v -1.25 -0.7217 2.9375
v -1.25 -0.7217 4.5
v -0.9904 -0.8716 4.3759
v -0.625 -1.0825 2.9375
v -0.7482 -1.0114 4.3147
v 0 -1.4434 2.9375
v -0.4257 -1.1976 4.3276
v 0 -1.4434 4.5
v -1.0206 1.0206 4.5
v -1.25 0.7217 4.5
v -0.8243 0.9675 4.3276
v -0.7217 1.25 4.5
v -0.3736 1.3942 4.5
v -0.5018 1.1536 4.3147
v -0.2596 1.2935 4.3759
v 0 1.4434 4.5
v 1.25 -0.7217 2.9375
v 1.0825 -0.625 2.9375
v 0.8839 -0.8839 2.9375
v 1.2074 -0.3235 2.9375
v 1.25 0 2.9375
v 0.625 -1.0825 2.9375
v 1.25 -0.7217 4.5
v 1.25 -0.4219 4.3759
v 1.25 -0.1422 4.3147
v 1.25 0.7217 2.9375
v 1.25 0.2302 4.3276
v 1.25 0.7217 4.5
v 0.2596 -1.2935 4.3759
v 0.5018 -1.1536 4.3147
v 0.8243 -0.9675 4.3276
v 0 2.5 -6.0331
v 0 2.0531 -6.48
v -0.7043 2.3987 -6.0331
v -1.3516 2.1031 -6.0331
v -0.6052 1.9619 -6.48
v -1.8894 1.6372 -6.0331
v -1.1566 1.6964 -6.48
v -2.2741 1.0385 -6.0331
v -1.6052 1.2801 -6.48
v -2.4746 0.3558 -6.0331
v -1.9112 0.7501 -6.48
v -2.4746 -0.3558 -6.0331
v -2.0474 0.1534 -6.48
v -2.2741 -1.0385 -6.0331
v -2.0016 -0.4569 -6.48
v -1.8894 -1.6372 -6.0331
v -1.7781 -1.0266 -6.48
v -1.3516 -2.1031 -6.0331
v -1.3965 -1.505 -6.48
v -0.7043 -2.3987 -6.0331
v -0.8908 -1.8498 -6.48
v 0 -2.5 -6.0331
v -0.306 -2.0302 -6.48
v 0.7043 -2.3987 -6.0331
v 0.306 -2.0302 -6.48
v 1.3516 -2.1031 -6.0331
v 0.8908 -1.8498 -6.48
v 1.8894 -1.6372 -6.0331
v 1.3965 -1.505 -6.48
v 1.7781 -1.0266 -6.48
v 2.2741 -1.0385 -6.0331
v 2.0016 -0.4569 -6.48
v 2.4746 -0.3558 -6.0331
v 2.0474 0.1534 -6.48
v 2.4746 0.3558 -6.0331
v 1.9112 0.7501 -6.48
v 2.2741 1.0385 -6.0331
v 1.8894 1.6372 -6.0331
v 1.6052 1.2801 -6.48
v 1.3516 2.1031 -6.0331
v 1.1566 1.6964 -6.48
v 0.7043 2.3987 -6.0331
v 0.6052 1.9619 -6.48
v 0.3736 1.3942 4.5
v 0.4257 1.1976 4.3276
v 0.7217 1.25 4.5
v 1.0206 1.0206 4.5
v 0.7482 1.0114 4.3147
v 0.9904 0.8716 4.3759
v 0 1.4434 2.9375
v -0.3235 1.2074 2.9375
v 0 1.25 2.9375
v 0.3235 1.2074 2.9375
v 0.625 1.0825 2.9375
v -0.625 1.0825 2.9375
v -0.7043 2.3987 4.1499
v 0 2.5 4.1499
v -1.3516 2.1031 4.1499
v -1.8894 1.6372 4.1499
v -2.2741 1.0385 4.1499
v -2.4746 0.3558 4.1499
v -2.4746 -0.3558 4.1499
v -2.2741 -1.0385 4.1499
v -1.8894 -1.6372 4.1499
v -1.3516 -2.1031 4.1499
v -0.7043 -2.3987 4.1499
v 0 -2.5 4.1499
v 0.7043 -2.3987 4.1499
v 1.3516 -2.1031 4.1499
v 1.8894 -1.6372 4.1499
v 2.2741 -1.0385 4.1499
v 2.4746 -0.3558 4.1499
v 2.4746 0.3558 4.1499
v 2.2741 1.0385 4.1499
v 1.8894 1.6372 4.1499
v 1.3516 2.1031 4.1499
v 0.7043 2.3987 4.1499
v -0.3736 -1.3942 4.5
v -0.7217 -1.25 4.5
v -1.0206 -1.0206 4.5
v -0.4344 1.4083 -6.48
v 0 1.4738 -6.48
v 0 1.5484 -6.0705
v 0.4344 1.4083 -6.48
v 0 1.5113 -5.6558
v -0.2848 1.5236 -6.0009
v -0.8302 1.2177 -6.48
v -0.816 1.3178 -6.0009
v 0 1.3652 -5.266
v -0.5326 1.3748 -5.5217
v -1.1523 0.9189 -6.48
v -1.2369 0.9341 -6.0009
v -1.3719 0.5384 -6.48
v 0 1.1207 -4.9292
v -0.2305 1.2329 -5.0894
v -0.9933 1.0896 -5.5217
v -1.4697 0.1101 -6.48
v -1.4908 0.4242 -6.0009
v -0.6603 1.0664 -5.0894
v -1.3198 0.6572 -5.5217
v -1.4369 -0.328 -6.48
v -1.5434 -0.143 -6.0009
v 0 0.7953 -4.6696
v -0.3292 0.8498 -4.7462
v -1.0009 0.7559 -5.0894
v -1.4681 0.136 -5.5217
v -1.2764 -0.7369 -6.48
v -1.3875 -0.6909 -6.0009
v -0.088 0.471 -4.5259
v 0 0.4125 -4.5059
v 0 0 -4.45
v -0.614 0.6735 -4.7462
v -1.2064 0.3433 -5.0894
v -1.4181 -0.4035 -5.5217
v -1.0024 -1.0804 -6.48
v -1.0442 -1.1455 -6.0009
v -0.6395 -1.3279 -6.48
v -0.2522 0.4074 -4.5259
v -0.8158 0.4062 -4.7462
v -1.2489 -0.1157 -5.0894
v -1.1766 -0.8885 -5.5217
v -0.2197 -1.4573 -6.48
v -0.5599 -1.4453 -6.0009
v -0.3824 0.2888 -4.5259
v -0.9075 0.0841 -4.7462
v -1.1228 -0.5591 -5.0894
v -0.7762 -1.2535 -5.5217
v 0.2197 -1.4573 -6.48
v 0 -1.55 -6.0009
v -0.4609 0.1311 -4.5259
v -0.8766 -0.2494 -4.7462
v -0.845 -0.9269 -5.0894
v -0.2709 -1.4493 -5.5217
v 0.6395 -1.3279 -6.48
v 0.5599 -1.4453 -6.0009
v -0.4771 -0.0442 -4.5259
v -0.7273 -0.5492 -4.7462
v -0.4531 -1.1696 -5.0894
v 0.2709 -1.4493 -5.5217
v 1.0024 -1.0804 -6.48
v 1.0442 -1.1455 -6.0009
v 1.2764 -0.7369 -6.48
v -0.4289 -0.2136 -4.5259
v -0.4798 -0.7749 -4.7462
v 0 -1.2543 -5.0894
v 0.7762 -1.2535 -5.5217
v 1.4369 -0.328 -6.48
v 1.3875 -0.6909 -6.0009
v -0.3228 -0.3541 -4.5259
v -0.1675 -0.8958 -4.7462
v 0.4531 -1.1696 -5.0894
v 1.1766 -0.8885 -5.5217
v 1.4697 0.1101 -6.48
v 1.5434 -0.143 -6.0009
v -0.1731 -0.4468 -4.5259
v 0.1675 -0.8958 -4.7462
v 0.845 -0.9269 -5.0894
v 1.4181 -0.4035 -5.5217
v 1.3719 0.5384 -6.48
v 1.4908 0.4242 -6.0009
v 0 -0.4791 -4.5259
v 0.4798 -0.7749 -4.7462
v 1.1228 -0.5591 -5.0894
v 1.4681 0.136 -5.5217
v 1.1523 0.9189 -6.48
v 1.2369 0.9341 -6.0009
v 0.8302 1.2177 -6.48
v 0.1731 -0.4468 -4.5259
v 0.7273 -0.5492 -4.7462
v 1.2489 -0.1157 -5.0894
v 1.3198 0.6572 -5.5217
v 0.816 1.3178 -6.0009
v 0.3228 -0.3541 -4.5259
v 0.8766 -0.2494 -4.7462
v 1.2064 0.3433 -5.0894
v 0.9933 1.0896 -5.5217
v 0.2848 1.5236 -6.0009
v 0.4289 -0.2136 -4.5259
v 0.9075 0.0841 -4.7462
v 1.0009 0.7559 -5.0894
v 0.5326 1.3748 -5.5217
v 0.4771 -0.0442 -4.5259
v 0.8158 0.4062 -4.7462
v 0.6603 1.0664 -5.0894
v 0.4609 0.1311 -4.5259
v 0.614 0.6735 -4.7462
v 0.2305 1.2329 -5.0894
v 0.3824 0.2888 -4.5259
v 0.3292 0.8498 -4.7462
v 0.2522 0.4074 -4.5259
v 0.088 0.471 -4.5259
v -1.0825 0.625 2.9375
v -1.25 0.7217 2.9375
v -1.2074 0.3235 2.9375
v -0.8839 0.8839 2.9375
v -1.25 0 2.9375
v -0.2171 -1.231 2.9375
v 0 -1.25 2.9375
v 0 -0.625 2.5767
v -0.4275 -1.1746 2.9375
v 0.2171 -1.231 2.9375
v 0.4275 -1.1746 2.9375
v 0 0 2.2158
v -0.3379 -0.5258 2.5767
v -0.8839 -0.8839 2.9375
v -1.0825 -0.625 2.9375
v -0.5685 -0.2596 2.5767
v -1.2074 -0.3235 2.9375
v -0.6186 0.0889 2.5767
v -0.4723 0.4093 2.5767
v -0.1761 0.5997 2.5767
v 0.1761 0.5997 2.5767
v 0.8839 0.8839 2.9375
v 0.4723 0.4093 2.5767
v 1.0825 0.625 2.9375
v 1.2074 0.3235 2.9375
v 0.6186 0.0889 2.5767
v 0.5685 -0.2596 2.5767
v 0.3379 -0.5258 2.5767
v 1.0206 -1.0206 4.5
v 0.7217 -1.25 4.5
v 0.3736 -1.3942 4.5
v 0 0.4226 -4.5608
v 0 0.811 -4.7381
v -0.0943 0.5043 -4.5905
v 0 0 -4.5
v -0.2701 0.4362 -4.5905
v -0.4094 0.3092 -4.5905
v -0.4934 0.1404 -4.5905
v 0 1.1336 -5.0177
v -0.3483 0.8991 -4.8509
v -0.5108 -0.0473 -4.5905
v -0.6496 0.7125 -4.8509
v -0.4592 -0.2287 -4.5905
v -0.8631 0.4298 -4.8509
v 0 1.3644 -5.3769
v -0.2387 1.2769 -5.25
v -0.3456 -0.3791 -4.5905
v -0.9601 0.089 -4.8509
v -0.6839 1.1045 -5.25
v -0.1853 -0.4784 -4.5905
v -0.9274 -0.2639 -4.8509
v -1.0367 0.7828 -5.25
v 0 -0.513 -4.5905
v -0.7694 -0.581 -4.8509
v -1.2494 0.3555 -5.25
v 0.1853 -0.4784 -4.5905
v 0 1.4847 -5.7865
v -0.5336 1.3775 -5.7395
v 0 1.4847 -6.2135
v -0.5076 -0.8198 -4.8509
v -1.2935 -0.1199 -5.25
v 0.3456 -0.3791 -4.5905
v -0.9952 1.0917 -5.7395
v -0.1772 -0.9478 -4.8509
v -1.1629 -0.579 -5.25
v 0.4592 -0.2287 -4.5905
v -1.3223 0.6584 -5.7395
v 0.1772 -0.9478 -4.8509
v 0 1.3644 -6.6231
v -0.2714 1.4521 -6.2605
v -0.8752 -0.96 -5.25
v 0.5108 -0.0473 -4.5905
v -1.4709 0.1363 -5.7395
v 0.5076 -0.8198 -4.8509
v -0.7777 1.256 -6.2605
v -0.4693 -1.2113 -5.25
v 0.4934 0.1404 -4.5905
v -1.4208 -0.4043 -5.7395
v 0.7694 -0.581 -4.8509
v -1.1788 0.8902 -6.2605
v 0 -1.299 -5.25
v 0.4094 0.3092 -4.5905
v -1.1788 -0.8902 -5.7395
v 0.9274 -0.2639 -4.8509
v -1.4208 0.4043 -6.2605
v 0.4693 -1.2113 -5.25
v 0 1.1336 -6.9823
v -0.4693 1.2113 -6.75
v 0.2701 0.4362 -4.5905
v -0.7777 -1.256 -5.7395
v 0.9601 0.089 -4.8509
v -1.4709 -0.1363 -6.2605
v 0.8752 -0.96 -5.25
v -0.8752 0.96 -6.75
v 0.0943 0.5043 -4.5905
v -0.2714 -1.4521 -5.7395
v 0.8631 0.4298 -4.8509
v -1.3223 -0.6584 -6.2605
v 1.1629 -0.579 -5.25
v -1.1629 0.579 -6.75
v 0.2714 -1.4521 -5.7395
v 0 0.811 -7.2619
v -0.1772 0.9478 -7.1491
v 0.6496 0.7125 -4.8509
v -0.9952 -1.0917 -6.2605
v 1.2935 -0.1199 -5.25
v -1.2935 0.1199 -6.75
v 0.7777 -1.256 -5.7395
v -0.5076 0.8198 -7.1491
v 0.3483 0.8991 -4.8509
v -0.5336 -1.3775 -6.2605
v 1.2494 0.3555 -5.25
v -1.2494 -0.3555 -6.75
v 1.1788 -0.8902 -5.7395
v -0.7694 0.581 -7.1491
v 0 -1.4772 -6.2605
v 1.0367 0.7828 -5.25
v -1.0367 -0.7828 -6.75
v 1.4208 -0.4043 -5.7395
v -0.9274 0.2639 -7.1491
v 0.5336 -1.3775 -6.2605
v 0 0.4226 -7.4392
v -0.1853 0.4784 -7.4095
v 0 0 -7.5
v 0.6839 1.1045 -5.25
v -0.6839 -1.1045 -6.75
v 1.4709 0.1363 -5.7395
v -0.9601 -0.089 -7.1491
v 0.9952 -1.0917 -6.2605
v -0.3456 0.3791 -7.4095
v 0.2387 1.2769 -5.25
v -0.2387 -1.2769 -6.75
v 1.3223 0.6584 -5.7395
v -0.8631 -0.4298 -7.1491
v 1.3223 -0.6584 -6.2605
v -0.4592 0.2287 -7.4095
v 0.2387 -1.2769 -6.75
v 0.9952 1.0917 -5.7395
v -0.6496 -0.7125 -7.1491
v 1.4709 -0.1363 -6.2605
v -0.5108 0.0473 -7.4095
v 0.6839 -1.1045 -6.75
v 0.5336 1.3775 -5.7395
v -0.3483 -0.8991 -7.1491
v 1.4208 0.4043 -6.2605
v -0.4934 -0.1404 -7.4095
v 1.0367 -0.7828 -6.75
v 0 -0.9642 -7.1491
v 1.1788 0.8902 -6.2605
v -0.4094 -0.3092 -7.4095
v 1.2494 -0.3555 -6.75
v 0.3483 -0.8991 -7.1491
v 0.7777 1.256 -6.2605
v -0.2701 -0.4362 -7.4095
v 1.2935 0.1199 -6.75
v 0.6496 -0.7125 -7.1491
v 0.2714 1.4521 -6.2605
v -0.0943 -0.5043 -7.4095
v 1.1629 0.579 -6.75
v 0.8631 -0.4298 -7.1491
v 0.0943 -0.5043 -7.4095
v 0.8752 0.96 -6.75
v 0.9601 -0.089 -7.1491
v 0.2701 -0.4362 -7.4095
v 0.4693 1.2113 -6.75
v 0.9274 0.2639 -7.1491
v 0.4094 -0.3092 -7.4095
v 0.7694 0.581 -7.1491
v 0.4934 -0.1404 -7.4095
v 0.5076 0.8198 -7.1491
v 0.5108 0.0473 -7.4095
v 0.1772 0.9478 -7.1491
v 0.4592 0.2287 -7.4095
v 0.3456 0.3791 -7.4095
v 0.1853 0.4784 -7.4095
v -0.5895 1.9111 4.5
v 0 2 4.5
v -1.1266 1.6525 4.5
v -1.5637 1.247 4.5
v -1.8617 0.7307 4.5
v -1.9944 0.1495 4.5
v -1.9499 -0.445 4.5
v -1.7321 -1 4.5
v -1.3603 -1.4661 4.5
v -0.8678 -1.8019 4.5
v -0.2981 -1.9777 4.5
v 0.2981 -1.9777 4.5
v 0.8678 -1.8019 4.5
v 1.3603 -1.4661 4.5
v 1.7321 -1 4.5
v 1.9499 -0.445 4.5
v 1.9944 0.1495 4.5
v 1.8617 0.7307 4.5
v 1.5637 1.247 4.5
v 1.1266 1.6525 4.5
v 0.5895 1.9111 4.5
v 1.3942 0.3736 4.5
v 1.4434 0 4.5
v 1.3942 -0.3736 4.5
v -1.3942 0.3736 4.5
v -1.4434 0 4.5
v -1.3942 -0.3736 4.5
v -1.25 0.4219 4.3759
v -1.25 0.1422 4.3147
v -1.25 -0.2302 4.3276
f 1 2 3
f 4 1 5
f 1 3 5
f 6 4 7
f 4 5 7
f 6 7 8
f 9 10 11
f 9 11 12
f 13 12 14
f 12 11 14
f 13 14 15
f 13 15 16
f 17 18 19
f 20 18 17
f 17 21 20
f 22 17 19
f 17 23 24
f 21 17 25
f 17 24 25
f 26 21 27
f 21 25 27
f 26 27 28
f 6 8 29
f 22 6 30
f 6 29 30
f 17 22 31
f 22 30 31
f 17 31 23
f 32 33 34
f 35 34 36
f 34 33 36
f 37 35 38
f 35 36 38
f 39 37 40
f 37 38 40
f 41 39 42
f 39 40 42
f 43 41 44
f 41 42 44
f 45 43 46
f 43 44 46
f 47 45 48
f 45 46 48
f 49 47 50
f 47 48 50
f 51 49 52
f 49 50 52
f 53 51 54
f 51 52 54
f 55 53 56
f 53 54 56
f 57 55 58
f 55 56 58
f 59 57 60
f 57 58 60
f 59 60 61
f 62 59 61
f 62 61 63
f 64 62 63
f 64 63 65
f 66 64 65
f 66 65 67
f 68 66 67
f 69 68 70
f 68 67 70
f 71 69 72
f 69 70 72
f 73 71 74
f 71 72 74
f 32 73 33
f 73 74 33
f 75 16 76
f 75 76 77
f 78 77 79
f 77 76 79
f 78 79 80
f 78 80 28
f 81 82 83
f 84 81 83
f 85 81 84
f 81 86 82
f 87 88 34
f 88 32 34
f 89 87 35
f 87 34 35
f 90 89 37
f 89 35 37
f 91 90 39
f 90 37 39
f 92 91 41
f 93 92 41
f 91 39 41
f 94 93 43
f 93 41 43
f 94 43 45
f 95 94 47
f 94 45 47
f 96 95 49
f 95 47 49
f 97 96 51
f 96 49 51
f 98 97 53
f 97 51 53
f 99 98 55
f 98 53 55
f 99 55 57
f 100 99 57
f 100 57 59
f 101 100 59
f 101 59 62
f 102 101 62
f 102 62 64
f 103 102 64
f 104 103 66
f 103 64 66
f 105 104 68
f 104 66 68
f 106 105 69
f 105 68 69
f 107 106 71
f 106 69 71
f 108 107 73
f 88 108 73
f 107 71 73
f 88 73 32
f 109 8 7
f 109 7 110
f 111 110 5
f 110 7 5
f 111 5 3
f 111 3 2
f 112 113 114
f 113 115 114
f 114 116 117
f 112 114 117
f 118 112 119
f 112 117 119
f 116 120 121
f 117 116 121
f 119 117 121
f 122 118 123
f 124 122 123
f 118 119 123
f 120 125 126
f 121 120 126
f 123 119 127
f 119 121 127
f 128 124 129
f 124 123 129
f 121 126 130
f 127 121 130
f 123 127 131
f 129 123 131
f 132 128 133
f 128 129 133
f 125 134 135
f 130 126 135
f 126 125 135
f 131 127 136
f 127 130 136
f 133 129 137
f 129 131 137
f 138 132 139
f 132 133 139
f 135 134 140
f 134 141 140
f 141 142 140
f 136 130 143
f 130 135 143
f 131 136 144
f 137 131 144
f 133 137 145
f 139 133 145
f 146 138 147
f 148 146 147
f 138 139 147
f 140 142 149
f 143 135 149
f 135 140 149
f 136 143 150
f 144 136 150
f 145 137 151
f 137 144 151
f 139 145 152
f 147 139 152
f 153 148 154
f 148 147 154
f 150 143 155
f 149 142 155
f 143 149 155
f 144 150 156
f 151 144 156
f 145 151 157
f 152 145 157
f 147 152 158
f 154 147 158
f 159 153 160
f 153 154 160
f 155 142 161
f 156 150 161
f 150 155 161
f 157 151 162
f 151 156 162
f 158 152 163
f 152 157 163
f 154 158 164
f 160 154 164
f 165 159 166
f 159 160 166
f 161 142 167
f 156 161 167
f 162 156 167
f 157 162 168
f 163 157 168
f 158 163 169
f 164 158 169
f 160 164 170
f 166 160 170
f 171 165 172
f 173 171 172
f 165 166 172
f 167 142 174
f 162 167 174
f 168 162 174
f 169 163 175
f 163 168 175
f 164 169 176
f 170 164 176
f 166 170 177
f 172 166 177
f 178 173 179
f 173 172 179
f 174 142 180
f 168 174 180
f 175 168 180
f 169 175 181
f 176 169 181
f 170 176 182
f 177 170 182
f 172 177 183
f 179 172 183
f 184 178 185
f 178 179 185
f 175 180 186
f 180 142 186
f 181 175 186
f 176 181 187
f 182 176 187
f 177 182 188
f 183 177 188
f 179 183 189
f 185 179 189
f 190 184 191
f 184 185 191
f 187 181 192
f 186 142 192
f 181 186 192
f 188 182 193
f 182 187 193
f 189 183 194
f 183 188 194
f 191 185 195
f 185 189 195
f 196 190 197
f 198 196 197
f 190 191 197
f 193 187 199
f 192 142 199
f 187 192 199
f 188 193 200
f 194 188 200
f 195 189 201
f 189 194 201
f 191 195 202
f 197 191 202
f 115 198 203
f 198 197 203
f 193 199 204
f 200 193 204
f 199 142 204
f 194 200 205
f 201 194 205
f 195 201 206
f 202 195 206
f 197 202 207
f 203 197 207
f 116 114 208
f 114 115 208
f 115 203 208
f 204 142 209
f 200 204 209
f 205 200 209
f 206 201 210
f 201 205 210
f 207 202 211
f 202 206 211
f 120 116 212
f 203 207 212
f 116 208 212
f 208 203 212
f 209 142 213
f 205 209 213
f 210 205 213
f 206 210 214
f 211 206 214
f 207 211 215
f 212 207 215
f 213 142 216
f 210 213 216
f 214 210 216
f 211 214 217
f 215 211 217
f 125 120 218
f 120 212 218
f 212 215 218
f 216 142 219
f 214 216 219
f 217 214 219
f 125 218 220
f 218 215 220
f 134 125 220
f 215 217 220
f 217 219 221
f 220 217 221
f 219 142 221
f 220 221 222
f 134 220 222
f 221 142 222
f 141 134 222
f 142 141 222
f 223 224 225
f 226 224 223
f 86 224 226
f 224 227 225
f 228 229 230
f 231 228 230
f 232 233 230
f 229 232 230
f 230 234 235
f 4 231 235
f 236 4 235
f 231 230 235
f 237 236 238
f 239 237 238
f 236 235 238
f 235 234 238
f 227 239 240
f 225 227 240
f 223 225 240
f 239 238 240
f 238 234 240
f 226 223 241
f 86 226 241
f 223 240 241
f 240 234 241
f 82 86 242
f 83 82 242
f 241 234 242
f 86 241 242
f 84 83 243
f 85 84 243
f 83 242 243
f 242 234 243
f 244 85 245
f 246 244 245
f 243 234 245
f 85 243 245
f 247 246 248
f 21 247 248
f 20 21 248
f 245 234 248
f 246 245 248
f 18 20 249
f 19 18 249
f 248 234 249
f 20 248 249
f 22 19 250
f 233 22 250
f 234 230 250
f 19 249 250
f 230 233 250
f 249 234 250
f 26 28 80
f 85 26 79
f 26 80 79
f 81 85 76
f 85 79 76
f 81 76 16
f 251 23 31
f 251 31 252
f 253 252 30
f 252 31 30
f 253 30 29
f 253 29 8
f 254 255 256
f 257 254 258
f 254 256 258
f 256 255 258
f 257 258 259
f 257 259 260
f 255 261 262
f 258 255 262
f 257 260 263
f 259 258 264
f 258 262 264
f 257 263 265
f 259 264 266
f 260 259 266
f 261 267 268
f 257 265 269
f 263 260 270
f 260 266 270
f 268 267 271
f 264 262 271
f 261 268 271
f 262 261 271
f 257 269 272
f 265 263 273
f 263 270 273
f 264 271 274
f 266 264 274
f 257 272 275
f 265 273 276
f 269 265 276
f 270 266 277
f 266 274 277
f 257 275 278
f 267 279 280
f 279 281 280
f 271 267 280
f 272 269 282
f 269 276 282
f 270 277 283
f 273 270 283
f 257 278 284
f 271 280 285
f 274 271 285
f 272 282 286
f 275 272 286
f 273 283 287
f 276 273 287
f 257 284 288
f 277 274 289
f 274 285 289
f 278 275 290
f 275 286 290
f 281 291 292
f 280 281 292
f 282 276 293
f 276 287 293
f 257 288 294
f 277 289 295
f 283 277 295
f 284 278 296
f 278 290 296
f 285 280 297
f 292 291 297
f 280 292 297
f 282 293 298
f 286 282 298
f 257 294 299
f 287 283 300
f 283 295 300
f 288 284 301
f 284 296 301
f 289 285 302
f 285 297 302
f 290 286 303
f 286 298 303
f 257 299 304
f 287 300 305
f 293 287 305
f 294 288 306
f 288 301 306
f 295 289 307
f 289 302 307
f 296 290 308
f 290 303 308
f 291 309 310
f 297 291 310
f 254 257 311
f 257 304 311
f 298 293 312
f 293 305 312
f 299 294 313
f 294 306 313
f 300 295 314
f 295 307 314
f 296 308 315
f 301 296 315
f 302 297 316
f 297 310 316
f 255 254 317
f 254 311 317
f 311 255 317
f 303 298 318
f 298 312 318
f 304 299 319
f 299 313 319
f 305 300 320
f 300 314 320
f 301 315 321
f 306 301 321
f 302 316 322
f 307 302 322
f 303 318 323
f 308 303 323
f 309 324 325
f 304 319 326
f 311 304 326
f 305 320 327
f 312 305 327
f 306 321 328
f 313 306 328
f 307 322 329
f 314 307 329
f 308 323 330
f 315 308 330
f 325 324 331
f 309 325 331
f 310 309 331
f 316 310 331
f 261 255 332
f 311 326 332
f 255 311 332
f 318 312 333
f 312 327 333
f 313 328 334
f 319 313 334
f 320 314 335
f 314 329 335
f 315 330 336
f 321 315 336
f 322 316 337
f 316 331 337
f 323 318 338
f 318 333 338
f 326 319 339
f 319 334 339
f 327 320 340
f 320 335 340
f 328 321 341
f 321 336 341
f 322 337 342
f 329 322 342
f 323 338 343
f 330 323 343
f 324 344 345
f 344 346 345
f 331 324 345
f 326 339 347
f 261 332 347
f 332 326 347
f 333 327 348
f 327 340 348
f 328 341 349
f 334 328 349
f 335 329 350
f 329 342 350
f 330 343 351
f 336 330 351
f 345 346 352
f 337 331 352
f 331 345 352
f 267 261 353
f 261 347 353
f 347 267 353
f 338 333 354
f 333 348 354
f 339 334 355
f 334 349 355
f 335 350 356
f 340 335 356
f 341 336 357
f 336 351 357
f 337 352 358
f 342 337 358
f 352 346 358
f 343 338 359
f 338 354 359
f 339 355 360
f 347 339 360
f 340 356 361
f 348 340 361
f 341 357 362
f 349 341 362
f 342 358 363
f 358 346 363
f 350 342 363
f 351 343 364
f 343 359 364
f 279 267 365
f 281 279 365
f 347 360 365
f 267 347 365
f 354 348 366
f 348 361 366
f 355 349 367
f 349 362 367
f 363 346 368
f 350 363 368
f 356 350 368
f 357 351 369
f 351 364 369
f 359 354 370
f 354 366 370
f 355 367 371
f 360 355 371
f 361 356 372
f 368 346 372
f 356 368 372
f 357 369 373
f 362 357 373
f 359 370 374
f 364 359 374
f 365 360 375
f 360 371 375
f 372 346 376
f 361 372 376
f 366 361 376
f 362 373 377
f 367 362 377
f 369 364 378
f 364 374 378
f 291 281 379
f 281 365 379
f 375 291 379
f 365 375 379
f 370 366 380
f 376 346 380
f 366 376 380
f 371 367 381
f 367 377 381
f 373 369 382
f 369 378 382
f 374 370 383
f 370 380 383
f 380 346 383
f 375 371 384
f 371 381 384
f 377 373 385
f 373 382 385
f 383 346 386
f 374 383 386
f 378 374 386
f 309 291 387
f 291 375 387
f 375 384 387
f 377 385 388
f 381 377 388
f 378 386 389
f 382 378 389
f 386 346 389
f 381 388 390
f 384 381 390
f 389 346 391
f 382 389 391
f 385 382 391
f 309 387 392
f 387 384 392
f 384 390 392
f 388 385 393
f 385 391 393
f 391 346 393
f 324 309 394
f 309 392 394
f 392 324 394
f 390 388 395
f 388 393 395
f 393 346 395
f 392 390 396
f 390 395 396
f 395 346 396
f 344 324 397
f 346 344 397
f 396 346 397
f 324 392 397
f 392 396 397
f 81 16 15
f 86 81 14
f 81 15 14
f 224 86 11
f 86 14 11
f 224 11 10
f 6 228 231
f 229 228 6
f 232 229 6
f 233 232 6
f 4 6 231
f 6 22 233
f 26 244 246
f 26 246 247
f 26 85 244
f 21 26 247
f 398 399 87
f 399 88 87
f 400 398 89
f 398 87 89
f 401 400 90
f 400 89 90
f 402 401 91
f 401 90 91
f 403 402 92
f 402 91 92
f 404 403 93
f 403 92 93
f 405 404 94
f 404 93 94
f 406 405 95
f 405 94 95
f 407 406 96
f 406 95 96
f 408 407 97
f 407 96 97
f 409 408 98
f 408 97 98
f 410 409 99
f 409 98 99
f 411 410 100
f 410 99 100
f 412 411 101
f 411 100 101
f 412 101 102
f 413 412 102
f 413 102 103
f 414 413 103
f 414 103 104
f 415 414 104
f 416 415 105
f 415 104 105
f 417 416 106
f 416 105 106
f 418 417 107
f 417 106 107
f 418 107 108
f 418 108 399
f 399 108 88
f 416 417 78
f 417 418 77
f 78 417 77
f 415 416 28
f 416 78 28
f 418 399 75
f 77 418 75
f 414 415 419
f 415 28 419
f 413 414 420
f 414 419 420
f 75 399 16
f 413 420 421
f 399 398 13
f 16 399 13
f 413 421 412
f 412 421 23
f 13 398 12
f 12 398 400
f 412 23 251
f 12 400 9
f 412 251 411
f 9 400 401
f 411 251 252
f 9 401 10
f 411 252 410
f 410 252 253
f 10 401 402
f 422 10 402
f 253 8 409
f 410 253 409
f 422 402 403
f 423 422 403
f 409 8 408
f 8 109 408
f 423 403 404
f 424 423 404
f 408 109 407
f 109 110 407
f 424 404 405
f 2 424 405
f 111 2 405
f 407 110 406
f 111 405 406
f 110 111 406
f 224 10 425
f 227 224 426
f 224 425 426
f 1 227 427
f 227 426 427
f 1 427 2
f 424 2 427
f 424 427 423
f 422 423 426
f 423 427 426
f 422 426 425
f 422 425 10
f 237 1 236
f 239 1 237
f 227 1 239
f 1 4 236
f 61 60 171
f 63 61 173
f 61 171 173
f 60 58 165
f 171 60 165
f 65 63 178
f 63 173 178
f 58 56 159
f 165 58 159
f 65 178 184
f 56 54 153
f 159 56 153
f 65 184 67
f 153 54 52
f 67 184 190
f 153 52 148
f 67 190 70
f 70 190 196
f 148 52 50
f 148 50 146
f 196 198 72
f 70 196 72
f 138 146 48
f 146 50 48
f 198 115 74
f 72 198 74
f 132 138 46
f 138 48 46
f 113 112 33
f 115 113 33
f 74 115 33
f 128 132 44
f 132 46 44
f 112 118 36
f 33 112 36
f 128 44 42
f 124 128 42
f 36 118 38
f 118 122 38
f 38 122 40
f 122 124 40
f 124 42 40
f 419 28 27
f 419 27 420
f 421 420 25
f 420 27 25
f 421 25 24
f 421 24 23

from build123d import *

# Parameters (mm, degrees)
CUT_EXTRUDE10_DEPTH = 1.5625
MOVE_FACE1_BY       = 0.05


with BuildPart() as part:
    # Sketch22 → Revolve1 (revolve)
    with BuildSketch(Plane(origin=(0, 0, 0), x_dir=(0, 0, -1), z_dir=(1, 0, 0))):
        with BuildLine():
            Line((-4.5, 0), (-4.5, 2))
            Line((-4.5, 2), (-4.149896231, 2.5))
            Line((-4.149896231, 2.5), (6.033115887, 2.5))
            Line((6.033115887, 2.5), (6.48, 2.053115887))
            Line((6.48, 2.053115887), (6.48, 1.421126314))
            ThreePointArc((6.48, 1.421126314), (5.125357216, 1.218605761), (4.5, 0))
            Line((4.5, 0), (-4.5, 0))
        make_face()
    revolve(axis=Axis((0, 0, -7.5), (0, 0, 1)))

    # Sketch23 → Cut-Extrude10 (cut)
    with BuildSketch(Plane.XY.offset(4.5)):
        Polygon((0, 1.443375673), (-1.25, 0.721687836), (-1.25, -0.721687836), (0, -1.443375673), (1.25, -0.721687836), (1.25, 0.721687836), align=None)
    extrude(amount=-CUT_EXTRUDE10_DEPTH, mode=Mode.SUBTRACT)

    # Cut-Extrude11 cone 1 section (through the dimple's axis) → Cut-Extrude11 (revolve, cut)
    with BuildSketch(Plane(origin=(0, 0, 4.5), x_dir=(0, -1, 0), z_dir=(1, 0, 0))):
        Polygon((0, 0), (1.443375673, 0), (0, 1.443375673), align=None)
    revolve(axis=Axis((0, 0, 4.5), (0, 0, -1)), mode=Mode.SUBTRACT)

    # Cut-Extrude12 cone 1 section (through the dimple's axis) → Cut-Extrude12 (revolve, cut)
    with BuildSketch(Plane(origin=(0, 0, 2.9375), x_dir=(0, -1, 0), z_dir=(1, 0, 0))):
        Polygon((0, 0), (1.25, 0), (0, 0.721687836), align=None)
    revolve(axis=Axis((0, 0, 2.9375), (0, 0, -1)), mode=Mode.SUBTRACT)

    # Move Face1: a curved face moved inward by 0.05
    add(Solid.thicken(part.faces().sort_by_distance((0, -1.218605761, -5.125357216))[0], -MOVE_FACE1_BY), mode=Mode.SUBTRACT)


with BuildPart() as body_2:
    # Sketch32 → Revolve2 (revolve)
    with BuildSketch(Plane(origin=(0, 0, 0), x_dir=(0, 0, -1), z_dir=(1, 0, 0))):
        with BuildLine():
            Line((7.5, 0), (4.5, 0))
            ThreePointArc((4.5, 0), (6, 1.5), (7.5, 0))
        make_face()
    revolve(axis=Axis((0, 0, -7.5), (0, 0, 1)))


solid = Compound([part.part, body_2.part])
